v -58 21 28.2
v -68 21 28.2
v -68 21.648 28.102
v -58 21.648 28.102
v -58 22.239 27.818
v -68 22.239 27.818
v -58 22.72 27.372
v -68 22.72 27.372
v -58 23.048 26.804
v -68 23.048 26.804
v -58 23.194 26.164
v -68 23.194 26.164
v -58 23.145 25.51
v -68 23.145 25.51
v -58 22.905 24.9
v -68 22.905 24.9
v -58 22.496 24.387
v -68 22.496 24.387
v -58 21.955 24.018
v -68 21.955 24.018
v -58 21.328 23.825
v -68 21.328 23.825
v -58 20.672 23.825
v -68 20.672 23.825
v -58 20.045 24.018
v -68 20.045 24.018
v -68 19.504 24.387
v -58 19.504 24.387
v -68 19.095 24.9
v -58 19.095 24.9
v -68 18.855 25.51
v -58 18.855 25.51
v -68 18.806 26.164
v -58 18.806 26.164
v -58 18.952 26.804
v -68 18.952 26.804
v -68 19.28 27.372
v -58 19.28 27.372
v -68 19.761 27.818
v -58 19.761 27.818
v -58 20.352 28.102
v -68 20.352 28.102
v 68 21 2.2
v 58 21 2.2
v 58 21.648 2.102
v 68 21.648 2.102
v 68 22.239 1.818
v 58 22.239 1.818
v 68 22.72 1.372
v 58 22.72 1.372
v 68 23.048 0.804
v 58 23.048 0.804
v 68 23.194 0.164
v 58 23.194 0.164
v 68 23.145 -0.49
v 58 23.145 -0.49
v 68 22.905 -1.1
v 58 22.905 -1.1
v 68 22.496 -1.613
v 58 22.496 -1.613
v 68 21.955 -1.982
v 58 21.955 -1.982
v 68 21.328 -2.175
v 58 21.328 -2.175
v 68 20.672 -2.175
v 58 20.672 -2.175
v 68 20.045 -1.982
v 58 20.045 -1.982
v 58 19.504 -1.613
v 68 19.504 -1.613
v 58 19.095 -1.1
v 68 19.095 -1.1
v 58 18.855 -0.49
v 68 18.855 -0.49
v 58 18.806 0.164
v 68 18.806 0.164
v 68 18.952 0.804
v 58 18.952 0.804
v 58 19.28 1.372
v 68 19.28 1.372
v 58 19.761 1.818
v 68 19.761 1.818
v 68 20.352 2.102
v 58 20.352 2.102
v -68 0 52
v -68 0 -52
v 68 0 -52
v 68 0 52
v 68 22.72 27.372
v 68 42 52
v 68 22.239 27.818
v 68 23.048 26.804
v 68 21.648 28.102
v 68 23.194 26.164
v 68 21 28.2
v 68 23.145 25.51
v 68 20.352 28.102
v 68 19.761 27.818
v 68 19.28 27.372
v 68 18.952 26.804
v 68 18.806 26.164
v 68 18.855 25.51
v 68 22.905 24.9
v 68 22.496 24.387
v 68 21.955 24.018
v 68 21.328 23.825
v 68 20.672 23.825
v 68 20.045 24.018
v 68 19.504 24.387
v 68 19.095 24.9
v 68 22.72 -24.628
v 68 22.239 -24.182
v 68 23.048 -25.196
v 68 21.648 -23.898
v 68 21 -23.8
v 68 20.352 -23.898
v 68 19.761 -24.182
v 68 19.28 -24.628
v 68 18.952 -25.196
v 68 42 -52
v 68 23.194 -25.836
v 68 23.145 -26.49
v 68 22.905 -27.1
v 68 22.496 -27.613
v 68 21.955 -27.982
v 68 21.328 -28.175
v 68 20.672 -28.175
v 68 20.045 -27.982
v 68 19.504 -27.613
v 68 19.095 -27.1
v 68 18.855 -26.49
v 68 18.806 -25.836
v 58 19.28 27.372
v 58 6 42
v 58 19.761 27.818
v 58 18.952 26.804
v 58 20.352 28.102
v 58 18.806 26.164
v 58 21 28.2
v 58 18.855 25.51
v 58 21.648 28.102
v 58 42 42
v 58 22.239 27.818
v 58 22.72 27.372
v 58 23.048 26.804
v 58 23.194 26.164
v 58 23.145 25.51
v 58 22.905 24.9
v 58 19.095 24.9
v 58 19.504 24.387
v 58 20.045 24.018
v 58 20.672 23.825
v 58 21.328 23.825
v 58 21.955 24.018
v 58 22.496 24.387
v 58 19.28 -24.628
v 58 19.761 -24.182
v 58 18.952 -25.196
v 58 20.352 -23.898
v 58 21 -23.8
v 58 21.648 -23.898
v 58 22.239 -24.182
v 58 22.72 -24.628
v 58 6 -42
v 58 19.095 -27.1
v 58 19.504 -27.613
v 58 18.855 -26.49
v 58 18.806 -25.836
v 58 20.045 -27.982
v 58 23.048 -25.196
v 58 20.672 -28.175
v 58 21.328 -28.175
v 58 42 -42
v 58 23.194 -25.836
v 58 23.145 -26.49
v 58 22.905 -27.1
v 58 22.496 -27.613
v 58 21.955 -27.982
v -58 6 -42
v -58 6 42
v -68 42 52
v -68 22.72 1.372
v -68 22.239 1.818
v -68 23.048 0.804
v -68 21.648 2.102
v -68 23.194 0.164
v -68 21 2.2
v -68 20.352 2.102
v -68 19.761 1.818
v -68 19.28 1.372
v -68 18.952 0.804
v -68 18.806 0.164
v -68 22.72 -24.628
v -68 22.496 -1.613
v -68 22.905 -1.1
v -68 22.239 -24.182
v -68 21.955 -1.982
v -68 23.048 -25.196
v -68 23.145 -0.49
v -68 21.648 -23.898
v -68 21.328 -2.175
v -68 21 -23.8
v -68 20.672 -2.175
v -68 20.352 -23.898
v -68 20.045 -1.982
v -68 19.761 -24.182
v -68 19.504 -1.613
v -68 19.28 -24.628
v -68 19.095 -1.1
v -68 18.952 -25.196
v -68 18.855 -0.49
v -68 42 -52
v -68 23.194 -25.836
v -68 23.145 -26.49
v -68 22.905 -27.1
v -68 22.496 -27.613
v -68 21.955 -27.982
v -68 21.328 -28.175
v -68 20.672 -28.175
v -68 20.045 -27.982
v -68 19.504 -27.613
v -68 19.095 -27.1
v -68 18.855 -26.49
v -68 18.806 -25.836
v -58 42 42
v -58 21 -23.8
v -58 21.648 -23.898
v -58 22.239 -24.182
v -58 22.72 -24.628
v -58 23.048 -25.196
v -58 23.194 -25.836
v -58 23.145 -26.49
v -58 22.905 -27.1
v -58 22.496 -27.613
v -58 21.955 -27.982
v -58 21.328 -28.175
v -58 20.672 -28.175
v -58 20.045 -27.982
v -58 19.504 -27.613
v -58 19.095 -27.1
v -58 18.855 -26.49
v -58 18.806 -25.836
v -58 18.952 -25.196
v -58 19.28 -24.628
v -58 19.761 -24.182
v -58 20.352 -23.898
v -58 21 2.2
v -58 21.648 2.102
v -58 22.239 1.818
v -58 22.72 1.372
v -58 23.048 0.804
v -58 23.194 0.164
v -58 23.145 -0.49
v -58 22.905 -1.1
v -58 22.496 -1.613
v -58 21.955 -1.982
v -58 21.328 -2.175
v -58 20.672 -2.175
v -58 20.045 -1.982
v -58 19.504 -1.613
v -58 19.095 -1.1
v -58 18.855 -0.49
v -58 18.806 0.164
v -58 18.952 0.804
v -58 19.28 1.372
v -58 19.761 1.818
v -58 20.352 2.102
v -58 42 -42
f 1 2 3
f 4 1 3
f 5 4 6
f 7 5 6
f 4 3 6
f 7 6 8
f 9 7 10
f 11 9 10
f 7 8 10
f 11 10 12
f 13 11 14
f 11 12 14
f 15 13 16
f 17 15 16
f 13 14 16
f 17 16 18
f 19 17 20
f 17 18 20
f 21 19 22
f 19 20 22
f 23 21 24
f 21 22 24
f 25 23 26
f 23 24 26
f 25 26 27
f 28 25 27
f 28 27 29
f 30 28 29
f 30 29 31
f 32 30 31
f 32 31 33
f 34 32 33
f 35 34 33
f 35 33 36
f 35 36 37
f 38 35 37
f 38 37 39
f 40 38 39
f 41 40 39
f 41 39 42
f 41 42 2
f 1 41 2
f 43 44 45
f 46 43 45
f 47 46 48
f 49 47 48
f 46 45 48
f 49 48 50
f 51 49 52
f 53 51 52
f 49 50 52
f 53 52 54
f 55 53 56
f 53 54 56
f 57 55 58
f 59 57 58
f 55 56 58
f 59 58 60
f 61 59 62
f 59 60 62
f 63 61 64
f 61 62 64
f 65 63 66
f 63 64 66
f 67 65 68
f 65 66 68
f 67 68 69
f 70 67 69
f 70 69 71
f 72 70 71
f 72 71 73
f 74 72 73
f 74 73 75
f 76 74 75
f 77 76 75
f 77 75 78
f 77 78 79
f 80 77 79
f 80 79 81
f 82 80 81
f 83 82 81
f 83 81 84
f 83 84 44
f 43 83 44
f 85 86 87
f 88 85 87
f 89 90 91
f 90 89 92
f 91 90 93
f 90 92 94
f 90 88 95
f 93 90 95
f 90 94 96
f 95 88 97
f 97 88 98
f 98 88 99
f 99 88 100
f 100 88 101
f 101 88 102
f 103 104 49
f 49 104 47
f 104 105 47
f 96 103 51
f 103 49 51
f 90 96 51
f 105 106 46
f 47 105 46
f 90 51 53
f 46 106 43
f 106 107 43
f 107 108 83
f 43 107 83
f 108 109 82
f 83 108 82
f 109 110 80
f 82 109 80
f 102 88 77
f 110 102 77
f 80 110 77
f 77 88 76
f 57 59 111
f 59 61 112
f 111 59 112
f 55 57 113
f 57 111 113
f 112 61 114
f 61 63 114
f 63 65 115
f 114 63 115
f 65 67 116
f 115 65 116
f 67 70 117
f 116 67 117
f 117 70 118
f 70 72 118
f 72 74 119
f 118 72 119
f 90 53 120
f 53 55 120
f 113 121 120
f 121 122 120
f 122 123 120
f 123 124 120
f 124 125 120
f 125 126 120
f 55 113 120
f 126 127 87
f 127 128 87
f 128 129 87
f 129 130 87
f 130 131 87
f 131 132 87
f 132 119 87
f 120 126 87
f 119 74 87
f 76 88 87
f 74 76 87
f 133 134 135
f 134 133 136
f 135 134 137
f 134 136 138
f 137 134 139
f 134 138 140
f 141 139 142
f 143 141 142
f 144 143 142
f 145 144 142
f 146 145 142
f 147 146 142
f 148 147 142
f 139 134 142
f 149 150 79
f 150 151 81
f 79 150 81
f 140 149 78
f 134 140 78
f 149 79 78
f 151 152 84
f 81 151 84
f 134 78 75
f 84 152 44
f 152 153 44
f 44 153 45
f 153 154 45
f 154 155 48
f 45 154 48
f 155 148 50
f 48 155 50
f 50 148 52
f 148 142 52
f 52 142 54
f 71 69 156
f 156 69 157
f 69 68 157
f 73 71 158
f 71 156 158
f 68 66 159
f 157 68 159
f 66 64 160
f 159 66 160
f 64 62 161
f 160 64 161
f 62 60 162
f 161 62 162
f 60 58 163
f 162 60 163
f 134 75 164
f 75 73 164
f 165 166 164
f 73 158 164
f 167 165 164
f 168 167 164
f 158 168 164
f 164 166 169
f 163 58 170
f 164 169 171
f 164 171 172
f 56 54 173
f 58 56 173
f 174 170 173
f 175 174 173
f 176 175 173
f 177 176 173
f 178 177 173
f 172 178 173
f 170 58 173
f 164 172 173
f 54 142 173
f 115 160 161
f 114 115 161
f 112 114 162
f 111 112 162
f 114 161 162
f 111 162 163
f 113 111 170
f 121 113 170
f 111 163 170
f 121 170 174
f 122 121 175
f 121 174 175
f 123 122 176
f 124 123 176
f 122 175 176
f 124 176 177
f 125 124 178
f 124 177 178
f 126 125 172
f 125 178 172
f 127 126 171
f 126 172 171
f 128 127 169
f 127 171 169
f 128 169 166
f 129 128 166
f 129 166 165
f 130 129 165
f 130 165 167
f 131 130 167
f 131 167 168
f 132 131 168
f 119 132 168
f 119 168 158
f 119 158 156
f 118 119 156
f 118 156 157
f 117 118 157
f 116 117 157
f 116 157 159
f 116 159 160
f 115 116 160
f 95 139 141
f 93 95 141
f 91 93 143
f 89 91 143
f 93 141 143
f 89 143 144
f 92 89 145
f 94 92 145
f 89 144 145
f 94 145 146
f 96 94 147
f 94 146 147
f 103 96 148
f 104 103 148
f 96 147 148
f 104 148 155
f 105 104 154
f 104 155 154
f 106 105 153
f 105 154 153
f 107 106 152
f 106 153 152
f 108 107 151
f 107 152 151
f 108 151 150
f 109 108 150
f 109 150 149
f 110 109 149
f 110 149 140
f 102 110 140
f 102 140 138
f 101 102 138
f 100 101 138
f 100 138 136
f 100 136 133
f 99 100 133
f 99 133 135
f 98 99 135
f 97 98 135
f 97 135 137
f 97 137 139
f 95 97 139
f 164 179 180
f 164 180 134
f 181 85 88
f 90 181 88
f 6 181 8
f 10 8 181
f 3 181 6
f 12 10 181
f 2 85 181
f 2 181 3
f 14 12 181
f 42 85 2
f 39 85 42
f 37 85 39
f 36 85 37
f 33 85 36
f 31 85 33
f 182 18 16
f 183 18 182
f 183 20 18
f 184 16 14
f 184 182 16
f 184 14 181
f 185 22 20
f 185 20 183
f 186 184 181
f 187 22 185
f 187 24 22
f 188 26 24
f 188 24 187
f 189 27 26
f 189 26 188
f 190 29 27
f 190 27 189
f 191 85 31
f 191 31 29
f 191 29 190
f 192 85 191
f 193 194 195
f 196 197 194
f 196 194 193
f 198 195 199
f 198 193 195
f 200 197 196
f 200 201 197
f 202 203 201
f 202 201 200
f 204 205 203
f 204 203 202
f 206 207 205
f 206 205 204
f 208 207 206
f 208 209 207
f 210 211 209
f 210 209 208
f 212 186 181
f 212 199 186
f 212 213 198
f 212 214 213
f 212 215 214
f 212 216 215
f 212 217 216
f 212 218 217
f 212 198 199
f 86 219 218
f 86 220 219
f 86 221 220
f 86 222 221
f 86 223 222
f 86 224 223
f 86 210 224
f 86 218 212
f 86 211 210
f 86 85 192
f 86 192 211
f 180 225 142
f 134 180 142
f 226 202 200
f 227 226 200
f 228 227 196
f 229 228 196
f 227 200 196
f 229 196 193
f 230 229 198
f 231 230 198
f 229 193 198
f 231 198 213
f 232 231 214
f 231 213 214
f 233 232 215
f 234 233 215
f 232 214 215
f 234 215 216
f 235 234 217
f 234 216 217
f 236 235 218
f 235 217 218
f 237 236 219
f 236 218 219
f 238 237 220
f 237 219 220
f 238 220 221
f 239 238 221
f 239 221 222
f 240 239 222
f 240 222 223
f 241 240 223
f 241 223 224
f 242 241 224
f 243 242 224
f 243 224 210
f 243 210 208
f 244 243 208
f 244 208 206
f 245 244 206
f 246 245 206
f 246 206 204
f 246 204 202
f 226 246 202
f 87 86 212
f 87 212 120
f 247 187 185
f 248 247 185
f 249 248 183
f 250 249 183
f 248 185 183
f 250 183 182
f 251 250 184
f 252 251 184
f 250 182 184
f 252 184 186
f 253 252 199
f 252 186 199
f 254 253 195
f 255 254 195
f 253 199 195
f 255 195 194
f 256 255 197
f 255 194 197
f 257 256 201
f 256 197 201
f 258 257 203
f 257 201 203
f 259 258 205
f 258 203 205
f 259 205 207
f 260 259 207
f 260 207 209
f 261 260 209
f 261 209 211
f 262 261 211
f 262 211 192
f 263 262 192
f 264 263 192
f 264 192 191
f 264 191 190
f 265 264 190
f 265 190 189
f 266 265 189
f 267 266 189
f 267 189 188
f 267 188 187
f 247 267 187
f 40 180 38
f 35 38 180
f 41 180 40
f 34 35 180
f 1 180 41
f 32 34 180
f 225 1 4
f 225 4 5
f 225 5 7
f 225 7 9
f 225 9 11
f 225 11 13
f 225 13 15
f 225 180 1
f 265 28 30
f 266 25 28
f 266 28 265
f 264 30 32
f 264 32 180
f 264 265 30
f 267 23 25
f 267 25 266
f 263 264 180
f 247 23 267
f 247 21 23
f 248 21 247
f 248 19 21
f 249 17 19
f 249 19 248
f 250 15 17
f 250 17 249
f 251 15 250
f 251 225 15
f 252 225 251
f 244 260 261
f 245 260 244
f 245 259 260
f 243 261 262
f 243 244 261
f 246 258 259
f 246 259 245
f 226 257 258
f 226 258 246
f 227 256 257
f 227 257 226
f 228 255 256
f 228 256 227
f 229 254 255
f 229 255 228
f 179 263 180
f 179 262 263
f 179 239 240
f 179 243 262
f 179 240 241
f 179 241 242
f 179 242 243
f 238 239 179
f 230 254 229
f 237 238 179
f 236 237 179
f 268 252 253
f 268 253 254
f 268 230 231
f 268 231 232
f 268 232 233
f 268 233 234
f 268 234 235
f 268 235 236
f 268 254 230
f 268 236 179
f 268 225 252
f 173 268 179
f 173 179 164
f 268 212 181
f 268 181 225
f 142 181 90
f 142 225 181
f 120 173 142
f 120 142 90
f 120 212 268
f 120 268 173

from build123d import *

# Parameters (mm, degrees)
SKETCH_1_W          = 136
SKETCH_1_H          = 104
EXTRUDE_1_DEPTH     = 42
SKETCH_2_W          = 116
SKETCH_2_H          = 84
CUT_EXTRUDE_1_DEPTH = 36
SKETCH_6_R          = 2.2
CUT_EXTRUDE_5_DEPTH = 136


with BuildPart() as part:
    # 草图1 → 凸台-拉伸1 (new body)
    with BuildSketch(Plane(origin=(0, 0, 0), x_dir=(1, 0, 0), z_dir=(0, 1, 0))):
        Rectangle(SKETCH_1_W, SKETCH_1_H)
    extrude(amount=EXTRUDE_1_DEPTH)

    # 草图2 → 切除-拉伸1 (cut)
    with BuildSketch(Plane(origin=(0, 42, 0), x_dir=(1, 0, 0), z_dir=(0, 1, 0))):
        Rectangle(SKETCH_2_W, SKETCH_2_H)
    extrude(amount=-CUT_EXTRUDE_1_DEPTH, mode=Mode.SUBTRACT)

    # 草图6 → 切除-拉伸5 (cut)
    with BuildSketch(Plane.ZY.offset(68)):
        with Locations((-26, 21)):
            Circle(SKETCH_6_R)
        with Locations((26, 21)):
            Circle(SKETCH_6_R)
        with Locations((0, 21)):
            Circle(SKETCH_6_R)
    extrude(amount=-CUT_EXTRUDE_5_DEPTH, mode=Mode.SUBTRACT)


solid = part.part
